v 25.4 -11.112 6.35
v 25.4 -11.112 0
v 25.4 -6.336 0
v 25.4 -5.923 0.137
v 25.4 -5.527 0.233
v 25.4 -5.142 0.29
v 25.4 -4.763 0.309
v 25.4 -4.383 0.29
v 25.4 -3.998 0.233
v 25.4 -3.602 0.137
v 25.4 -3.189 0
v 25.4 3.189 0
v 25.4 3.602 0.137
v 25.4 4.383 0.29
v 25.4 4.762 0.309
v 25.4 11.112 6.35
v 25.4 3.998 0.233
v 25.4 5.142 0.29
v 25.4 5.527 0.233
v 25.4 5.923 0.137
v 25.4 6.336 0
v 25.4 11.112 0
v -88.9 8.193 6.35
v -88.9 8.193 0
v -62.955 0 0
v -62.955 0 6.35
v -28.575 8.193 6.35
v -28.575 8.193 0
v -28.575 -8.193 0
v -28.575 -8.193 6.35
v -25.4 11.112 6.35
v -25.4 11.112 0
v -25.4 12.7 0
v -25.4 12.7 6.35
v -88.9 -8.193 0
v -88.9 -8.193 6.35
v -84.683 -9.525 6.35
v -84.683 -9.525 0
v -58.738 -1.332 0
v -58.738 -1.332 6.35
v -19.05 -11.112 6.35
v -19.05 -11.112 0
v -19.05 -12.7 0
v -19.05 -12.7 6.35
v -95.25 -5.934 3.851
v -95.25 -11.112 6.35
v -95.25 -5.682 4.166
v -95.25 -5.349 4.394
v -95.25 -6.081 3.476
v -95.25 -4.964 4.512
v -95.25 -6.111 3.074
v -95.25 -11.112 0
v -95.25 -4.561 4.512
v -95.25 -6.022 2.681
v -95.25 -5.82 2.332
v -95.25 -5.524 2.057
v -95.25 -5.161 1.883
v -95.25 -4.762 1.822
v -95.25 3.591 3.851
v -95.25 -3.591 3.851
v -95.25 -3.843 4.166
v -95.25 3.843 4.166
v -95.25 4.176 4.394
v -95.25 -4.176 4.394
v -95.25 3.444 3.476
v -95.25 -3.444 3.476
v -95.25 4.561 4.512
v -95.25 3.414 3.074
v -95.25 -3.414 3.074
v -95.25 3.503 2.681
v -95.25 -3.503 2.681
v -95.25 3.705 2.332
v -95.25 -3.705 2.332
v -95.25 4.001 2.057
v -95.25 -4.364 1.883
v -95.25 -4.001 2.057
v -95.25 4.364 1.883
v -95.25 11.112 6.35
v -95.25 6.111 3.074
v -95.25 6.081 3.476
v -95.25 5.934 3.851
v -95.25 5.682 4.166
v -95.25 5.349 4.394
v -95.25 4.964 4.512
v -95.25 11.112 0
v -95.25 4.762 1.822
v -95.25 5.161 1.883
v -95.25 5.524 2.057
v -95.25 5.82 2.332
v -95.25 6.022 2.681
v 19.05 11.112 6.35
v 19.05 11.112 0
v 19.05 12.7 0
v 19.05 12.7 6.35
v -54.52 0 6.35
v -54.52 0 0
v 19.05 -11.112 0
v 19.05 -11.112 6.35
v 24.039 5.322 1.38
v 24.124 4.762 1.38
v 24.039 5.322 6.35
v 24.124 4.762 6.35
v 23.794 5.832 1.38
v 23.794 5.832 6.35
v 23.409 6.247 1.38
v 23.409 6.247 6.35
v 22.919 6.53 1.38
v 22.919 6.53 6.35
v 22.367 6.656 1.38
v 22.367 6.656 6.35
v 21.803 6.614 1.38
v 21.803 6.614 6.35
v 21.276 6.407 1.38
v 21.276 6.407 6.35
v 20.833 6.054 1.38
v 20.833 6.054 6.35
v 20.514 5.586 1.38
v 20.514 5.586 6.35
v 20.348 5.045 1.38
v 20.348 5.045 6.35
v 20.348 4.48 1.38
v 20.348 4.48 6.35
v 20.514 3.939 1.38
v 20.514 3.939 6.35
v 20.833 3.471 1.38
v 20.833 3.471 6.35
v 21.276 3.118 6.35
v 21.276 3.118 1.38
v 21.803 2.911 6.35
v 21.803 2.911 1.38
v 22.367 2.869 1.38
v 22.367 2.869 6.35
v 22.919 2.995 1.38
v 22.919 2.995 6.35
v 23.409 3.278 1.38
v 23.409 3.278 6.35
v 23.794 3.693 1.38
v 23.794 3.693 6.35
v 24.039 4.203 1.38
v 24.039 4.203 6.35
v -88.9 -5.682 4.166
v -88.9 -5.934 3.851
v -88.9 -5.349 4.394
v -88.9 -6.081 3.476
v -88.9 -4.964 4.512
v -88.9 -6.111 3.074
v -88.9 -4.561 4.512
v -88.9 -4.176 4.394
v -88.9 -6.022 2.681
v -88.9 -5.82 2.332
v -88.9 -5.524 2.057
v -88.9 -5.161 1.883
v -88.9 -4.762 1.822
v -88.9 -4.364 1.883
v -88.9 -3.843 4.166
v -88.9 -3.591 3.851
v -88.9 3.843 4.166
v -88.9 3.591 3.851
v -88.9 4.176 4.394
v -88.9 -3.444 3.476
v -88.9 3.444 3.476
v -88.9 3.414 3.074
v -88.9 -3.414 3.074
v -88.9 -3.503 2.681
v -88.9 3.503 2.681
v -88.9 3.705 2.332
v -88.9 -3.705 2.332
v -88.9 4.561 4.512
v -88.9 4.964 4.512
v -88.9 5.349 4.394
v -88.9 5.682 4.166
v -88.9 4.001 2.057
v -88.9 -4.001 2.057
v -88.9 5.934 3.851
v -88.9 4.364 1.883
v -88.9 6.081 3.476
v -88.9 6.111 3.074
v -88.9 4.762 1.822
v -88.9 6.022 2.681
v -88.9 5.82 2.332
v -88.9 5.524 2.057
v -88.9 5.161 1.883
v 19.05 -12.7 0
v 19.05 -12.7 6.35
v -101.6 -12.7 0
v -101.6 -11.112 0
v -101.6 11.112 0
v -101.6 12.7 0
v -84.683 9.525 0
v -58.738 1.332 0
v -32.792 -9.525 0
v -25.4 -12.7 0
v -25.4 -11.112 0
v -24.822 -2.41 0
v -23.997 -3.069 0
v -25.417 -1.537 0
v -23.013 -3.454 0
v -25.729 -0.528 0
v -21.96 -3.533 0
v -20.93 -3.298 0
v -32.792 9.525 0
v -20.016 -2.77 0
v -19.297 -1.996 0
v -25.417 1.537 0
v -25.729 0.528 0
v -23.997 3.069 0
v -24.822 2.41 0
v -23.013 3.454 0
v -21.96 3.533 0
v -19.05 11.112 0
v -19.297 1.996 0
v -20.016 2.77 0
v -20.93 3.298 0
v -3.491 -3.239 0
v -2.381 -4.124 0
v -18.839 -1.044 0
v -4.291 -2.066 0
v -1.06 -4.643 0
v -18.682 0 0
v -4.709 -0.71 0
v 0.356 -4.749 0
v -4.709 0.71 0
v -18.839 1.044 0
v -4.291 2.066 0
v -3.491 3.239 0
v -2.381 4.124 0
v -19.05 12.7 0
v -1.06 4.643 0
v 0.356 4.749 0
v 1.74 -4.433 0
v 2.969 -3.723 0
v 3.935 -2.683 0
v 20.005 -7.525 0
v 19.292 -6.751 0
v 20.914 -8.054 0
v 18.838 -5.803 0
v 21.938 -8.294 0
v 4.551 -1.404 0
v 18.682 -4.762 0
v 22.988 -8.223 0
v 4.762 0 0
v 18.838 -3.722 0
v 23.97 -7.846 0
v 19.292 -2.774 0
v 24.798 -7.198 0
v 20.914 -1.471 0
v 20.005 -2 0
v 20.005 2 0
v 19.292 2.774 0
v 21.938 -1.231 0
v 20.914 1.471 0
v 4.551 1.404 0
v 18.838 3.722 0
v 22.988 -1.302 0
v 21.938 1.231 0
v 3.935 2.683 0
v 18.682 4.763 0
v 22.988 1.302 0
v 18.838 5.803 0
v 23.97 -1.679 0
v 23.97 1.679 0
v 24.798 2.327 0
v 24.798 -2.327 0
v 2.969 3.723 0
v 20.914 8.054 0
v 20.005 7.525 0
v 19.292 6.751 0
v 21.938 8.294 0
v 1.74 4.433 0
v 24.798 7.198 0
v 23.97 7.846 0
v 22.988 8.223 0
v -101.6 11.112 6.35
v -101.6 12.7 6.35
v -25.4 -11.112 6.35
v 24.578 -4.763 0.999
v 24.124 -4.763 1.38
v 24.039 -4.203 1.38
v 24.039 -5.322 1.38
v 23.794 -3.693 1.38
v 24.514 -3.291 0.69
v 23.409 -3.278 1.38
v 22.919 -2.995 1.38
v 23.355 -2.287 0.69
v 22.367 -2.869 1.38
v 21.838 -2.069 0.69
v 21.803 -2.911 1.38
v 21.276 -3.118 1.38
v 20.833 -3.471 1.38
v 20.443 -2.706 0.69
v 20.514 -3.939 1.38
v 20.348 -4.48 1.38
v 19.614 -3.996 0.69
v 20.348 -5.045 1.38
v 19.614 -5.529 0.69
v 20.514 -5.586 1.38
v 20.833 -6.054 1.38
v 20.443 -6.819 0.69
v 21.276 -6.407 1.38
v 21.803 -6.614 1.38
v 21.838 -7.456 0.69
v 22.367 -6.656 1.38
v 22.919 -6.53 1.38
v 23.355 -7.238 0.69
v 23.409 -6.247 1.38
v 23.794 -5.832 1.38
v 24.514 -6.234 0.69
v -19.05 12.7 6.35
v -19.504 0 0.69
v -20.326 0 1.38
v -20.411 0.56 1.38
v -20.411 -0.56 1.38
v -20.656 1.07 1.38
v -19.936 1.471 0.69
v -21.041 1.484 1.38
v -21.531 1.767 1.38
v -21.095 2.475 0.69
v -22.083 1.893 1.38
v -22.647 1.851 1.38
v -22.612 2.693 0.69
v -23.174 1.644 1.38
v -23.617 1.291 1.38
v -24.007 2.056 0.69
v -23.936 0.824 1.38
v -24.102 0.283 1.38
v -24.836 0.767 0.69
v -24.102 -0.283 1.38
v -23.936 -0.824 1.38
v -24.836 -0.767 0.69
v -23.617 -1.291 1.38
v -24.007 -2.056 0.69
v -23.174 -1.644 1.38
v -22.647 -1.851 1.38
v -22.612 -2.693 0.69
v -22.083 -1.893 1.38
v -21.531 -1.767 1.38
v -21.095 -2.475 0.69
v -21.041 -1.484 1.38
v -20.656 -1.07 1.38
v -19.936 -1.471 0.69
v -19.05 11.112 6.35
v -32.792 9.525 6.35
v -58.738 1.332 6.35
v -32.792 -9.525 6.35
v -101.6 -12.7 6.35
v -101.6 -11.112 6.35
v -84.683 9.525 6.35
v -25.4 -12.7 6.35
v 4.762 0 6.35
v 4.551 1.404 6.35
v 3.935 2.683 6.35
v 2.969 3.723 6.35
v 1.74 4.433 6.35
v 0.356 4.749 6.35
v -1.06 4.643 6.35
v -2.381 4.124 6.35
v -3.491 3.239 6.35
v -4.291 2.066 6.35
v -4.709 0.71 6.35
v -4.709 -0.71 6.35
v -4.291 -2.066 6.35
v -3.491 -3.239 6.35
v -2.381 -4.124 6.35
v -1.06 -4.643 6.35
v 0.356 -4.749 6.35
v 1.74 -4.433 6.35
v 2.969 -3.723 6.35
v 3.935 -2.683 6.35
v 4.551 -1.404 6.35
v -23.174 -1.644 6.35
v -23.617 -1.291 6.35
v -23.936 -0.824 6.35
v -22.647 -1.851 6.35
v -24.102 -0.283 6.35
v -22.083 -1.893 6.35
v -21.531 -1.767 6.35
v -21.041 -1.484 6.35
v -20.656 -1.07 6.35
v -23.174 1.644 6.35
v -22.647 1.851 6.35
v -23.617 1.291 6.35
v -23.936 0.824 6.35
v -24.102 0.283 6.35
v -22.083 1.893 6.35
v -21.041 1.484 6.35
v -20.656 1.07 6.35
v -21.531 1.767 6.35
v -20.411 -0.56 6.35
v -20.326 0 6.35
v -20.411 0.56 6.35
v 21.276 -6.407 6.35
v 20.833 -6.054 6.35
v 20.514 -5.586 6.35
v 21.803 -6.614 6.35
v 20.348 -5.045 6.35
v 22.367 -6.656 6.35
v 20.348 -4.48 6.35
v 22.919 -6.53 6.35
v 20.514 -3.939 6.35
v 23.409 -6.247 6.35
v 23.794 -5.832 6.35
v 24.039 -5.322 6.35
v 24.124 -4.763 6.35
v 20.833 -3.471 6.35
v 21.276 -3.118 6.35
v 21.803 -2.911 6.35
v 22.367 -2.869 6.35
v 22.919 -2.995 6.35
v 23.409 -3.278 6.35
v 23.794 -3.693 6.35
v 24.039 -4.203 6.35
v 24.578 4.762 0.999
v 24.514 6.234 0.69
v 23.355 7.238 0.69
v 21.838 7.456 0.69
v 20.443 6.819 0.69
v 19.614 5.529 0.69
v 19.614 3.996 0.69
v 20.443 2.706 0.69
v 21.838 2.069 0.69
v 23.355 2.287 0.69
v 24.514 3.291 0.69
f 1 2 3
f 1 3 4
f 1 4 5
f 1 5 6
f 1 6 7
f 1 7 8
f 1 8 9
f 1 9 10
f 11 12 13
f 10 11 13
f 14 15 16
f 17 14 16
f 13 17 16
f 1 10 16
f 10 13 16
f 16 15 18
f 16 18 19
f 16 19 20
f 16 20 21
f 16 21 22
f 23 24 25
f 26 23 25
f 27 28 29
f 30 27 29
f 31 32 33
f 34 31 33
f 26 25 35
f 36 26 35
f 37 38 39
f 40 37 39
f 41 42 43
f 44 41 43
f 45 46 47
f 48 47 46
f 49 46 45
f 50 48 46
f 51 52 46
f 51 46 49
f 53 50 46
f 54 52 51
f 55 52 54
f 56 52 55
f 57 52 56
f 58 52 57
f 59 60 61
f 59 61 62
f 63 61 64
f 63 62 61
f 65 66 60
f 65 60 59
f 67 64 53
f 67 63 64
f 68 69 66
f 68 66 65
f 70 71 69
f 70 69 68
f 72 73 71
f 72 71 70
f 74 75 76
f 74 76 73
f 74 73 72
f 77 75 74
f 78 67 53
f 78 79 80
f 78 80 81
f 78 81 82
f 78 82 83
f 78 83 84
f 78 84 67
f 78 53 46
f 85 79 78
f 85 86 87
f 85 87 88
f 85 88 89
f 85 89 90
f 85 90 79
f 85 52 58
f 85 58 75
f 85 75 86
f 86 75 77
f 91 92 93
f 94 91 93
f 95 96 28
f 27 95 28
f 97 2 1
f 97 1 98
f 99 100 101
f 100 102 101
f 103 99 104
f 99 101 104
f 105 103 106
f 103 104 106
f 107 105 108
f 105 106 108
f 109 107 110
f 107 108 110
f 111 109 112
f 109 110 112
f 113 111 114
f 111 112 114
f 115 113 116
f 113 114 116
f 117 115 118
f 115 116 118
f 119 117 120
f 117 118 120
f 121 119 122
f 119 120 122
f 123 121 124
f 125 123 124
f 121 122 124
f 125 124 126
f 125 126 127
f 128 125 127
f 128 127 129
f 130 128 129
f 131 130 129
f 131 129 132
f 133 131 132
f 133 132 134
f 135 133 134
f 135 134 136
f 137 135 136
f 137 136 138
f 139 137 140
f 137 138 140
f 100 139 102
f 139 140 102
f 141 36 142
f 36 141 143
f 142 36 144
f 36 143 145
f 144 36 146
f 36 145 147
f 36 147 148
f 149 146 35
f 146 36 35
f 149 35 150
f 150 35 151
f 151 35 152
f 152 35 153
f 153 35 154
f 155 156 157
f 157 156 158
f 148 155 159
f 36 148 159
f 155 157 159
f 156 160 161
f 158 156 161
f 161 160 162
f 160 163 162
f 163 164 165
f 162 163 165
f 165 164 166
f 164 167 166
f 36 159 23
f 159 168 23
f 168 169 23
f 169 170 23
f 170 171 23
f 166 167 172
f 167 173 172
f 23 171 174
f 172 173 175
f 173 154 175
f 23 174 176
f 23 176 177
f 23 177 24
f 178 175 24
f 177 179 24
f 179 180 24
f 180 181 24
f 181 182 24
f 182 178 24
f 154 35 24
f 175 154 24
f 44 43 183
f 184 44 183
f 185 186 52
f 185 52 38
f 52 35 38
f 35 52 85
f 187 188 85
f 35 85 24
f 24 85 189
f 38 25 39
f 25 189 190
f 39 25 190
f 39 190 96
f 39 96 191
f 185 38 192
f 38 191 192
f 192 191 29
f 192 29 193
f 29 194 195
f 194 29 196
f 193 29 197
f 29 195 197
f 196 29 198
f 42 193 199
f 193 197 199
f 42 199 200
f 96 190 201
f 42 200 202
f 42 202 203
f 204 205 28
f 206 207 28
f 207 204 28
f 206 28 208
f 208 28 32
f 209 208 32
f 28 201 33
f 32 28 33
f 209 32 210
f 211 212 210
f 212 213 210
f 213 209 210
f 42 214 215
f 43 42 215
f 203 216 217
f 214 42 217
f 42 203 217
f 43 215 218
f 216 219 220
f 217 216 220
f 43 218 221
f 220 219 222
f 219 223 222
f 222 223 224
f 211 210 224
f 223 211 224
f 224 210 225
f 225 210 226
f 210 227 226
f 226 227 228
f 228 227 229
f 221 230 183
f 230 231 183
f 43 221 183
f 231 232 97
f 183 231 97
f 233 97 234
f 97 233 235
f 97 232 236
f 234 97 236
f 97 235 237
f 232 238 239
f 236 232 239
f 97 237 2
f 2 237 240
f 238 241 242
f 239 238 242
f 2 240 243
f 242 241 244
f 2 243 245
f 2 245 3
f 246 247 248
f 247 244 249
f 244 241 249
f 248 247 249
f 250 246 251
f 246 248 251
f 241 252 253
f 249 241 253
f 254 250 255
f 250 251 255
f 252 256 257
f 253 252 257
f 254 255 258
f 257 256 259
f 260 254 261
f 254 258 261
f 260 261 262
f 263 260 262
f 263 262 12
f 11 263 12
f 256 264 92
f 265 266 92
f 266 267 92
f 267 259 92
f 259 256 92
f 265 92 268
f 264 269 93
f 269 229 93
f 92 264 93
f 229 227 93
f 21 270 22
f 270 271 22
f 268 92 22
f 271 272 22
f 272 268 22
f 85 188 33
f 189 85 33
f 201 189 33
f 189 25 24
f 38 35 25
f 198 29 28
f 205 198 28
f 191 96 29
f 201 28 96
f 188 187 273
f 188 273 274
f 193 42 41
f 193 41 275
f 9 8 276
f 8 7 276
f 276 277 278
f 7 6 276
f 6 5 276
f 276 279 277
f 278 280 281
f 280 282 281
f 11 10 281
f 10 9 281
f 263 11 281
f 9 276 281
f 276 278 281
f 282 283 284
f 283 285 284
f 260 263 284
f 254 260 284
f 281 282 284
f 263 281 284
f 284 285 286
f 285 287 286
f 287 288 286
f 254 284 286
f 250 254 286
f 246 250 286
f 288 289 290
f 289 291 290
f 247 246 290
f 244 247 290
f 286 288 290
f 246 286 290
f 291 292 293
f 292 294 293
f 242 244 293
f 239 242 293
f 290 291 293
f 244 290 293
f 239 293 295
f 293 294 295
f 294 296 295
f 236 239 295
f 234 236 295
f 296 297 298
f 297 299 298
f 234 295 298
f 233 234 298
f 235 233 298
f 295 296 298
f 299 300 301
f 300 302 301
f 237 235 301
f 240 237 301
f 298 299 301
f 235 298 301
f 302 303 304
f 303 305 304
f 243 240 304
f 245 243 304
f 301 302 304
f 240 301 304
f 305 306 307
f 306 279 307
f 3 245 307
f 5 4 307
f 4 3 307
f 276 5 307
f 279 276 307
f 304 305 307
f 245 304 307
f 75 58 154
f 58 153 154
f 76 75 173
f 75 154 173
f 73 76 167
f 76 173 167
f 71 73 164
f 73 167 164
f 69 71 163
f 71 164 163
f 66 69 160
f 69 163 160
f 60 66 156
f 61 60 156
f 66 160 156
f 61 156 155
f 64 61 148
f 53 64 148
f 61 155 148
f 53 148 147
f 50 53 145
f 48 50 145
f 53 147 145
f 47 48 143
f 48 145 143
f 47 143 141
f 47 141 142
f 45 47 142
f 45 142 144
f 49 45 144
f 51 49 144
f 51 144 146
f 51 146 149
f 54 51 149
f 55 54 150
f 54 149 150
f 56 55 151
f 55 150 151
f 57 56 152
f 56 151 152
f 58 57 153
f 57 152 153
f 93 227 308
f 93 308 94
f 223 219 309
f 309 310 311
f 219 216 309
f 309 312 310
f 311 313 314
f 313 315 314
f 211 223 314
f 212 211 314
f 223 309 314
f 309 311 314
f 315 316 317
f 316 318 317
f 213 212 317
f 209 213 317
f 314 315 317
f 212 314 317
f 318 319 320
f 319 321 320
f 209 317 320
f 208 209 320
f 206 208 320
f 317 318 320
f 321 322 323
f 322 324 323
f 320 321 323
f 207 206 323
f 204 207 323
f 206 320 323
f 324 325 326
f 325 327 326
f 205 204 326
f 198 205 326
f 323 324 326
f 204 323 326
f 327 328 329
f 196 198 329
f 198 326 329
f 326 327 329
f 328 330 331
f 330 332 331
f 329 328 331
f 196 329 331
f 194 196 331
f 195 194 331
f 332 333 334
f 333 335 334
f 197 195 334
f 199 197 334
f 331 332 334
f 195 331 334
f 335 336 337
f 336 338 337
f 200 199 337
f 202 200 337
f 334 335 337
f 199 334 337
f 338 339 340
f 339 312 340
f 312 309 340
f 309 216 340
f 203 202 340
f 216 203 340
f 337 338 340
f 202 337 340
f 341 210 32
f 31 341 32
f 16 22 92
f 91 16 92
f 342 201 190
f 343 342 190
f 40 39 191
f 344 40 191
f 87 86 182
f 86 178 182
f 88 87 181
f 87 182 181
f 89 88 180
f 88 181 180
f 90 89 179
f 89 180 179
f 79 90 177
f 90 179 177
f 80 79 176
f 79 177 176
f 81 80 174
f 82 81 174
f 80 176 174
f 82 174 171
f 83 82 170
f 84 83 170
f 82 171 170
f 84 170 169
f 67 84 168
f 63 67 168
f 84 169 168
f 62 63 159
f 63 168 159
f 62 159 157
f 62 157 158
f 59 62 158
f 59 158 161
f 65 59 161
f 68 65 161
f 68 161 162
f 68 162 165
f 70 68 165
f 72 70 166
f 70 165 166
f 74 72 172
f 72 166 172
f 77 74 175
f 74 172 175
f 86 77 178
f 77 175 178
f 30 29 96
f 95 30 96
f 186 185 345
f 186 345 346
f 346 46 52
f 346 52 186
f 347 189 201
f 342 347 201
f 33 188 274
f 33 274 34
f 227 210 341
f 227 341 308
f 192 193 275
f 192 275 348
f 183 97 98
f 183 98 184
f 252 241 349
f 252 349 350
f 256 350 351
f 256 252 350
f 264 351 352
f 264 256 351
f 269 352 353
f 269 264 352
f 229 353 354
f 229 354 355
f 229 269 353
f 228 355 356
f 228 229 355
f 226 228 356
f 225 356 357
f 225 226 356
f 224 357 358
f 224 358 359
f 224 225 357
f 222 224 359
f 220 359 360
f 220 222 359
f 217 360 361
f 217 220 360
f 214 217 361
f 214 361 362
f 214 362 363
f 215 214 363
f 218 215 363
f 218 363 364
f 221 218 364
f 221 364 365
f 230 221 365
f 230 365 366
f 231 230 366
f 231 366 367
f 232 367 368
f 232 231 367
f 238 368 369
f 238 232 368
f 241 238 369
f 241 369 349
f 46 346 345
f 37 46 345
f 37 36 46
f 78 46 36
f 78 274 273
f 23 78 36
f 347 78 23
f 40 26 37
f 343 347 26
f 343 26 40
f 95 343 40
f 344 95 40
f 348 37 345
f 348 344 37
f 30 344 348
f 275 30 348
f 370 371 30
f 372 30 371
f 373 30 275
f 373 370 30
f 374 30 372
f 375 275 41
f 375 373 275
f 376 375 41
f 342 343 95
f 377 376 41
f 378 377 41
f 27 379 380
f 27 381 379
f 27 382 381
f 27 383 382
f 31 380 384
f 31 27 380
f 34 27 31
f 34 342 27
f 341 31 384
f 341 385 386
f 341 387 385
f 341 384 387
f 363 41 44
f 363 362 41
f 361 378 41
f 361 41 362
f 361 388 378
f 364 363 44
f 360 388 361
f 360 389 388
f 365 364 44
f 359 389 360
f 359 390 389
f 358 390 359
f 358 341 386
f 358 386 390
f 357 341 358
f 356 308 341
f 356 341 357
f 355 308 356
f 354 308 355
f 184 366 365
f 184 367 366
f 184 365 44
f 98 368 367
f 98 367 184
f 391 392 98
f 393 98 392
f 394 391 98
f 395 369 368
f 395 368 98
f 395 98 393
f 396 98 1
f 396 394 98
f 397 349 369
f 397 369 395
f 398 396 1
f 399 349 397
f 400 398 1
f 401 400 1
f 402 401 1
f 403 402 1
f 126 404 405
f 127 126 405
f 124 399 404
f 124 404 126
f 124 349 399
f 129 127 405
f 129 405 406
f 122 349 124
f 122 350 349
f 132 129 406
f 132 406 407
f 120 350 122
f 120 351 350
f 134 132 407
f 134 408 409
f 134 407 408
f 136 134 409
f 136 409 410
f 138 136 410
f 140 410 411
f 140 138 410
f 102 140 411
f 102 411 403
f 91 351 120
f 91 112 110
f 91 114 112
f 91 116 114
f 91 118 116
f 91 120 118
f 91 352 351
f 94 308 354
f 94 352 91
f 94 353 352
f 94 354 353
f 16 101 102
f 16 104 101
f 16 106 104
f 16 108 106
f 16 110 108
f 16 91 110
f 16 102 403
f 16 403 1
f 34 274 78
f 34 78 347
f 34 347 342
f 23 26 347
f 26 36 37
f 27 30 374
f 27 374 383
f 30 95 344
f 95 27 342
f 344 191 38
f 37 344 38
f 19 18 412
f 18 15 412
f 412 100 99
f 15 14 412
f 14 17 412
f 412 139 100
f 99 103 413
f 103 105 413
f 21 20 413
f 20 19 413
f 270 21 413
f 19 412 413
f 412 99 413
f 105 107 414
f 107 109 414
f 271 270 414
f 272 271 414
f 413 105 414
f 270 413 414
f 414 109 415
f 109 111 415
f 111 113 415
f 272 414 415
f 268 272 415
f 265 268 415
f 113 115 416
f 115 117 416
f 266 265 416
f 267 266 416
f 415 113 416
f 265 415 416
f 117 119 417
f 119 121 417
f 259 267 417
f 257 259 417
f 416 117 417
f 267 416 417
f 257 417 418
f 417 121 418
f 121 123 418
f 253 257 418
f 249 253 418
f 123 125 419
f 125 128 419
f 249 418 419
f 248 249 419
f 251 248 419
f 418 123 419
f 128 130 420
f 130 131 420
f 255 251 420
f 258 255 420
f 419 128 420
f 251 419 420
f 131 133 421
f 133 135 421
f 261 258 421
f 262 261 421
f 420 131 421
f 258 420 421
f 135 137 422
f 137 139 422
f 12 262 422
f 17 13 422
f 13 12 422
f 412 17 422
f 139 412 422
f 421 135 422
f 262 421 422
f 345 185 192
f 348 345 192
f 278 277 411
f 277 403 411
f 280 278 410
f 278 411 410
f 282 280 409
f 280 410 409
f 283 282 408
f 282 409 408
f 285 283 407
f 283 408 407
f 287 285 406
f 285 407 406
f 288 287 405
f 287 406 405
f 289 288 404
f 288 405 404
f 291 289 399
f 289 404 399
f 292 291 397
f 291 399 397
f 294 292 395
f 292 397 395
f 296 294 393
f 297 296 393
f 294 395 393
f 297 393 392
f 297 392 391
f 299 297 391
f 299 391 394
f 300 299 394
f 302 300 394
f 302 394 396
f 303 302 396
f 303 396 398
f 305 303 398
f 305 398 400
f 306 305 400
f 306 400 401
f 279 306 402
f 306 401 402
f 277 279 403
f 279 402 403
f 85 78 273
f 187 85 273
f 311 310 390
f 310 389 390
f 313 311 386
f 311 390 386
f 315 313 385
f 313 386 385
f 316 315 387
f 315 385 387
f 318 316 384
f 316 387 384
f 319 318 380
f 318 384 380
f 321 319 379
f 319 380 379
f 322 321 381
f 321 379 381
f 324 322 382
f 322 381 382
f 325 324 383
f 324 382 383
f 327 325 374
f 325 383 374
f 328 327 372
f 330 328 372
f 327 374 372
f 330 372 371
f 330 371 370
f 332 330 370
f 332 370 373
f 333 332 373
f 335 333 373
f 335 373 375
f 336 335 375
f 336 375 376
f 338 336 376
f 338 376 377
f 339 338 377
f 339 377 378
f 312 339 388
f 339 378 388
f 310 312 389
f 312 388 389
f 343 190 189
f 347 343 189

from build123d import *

# Parameters (mm, degrees)
SKETCH1_W                                         = 127
SKETCH1_H                                         = 25.4
SKETCH1_R                                         = 4.7625
BOSS_EXTRUDE1_DEPTH                               = 6.35
CSK_FOR_6_FLAT_HEAD_MACHINE_SCREW_100_D           = 3.7973
CSK_FOR_6_FLAT_HEAD_MACHINE_SCREW_100_CSINK_D     = 7.0866
CSK_FOR_6_FLAT_HEAD_MACHINE_SCREW_100_CSINK_ANGLE = 100
SKETCH5_W                                         = 6.35
SKETCH5_H                                         = 22.225
CUT_EXTRUDE1_DEPTH                                = 103.587389576
SKETCH6_W                                         = 6.35
SKETCH6_H                                         = 1.5875
CUT_EXTRUDE2_DEPTH                                = 103.587389576
TAP_DRILL_FOR_6_32_TAP1_D                         = 2.7051
TAP_DRILL_FOR_6_32_TAP1_DEPTH                     = 6.35
TAP_DRILL_FOR_6_32_TAP1_TIP                       = 0.81269403


with BuildPart() as part:
    # Sketch1 → Boss-Extrude1 (new body)
    with BuildSketch(Plane.XY):
        with Locations((-38.1, 0)):
            Rectangle(SKETCH1_W, SKETCH1_H)
        Polygon((-88.9, 8.193180488), (-62.954928456, 0), (-88.9, -8.193180488), align=None, mode=Mode.SUBTRACT)
        Polygon((-84.682571544, -9.525), (-58.7375, -1.331819512), (-32.792428456, -9.525), align=None, mode=Mode.SUBTRACT)
        Polygon((-28.575, -8.193180488), (-54.520071544, 0), (-28.575, 8.193180488), align=None, mode=Mode.SUBTRACT)
        Polygon((-32.792428456, 9.525), (-58.7375, 1.331819512), (-84.682571544, 9.525), align=None, mode=Mode.SUBTRACT)
        Circle(SKETCH1_R, mode=Mode.SUBTRACT)
    extrude(amount=BOSS_EXTRUDE1_DEPTH)

    # CSK for #6 Flat Head Machine Screw (100)1 (through all)
    with Locations(Plane(origin=(0, 0, 0), x_dir=(-1, 0, 0), z_dir=(0, 0, -1))):
        with Locations((-22.225, 4.7625), (-22.225, -4.7625), (22.225, 0)):
            CounterSinkHole(CSK_FOR_6_FLAT_HEAD_MACHINE_SCREW_100_D / 2, CSK_FOR_6_FLAT_HEAD_MACHINE_SCREW_100_CSINK_D / 2, counter_sink_angle=CSK_FOR_6_FLAT_HEAD_MACHINE_SCREW_100_CSINK_ANGLE)

    # Sketch5 → Cut-Extrude1 (cut, through all)
    with BuildSketch(Plane(origin=(0, 0, 0), x_dir=(-1, 0, 0), z_dir=(0, 0, -1))):
        with Locations((98.425, 0)):
            Rectangle(SKETCH5_W, SKETCH5_H)
    extrude(amount=-CUT_EXTRUDE1_DEPTH, mode=Mode.SUBTRACT)

    # Sketch6 → Cut-Extrude2 (cut, through all)
    with BuildSketch(Plane(origin=(0, 0, 0), x_dir=(-1, 0, 0), z_dir=(0, 0, -1))):
        with Locations((22.225, 11.90625)):
            Rectangle(SKETCH6_W, SKETCH6_H)
        with Locations((-22.225, 11.90625)):
            Rectangle(SKETCH6_W, SKETCH6_H)
    cut_extrude2 = extrude(amount=-CUT_EXTRUDE2_DEPTH, mode=Mode.SUBTRACT)

    # Mirror3: Cut-Extrude2 across plane
    add(cut_extrude2.mirror(Plane(origin=(0, 0, 0), x_dir=(0, 0, 1), z_dir=(0, -1, 0))), mode=Mode.SUBTRACT)

    # Tap Drill for #6-32 Tap1
    with Locations(Plane.ZY.offset(95.25)):
        with Locations((3.175, 4.7625), (3.175, -4.7625)):
            Hole(TAP_DRILL_FOR_6_32_TAP1_D / 2, depth=TAP_DRILL_FOR_6_32_TAP1_DEPTH)
            with Locations((0, 0, -(TAP_DRILL_FOR_6_32_TAP1_DEPTH + TAP_DRILL_FOR_6_32_TAP1_TIP / 2))):  # 118° drill point
                Cone(0, TAP_DRILL_FOR_6_32_TAP1_D / 2, TAP_DRILL_FOR_6_32_TAP1_TIP, mode=Mode.SUBTRACT)


solid = part.part
